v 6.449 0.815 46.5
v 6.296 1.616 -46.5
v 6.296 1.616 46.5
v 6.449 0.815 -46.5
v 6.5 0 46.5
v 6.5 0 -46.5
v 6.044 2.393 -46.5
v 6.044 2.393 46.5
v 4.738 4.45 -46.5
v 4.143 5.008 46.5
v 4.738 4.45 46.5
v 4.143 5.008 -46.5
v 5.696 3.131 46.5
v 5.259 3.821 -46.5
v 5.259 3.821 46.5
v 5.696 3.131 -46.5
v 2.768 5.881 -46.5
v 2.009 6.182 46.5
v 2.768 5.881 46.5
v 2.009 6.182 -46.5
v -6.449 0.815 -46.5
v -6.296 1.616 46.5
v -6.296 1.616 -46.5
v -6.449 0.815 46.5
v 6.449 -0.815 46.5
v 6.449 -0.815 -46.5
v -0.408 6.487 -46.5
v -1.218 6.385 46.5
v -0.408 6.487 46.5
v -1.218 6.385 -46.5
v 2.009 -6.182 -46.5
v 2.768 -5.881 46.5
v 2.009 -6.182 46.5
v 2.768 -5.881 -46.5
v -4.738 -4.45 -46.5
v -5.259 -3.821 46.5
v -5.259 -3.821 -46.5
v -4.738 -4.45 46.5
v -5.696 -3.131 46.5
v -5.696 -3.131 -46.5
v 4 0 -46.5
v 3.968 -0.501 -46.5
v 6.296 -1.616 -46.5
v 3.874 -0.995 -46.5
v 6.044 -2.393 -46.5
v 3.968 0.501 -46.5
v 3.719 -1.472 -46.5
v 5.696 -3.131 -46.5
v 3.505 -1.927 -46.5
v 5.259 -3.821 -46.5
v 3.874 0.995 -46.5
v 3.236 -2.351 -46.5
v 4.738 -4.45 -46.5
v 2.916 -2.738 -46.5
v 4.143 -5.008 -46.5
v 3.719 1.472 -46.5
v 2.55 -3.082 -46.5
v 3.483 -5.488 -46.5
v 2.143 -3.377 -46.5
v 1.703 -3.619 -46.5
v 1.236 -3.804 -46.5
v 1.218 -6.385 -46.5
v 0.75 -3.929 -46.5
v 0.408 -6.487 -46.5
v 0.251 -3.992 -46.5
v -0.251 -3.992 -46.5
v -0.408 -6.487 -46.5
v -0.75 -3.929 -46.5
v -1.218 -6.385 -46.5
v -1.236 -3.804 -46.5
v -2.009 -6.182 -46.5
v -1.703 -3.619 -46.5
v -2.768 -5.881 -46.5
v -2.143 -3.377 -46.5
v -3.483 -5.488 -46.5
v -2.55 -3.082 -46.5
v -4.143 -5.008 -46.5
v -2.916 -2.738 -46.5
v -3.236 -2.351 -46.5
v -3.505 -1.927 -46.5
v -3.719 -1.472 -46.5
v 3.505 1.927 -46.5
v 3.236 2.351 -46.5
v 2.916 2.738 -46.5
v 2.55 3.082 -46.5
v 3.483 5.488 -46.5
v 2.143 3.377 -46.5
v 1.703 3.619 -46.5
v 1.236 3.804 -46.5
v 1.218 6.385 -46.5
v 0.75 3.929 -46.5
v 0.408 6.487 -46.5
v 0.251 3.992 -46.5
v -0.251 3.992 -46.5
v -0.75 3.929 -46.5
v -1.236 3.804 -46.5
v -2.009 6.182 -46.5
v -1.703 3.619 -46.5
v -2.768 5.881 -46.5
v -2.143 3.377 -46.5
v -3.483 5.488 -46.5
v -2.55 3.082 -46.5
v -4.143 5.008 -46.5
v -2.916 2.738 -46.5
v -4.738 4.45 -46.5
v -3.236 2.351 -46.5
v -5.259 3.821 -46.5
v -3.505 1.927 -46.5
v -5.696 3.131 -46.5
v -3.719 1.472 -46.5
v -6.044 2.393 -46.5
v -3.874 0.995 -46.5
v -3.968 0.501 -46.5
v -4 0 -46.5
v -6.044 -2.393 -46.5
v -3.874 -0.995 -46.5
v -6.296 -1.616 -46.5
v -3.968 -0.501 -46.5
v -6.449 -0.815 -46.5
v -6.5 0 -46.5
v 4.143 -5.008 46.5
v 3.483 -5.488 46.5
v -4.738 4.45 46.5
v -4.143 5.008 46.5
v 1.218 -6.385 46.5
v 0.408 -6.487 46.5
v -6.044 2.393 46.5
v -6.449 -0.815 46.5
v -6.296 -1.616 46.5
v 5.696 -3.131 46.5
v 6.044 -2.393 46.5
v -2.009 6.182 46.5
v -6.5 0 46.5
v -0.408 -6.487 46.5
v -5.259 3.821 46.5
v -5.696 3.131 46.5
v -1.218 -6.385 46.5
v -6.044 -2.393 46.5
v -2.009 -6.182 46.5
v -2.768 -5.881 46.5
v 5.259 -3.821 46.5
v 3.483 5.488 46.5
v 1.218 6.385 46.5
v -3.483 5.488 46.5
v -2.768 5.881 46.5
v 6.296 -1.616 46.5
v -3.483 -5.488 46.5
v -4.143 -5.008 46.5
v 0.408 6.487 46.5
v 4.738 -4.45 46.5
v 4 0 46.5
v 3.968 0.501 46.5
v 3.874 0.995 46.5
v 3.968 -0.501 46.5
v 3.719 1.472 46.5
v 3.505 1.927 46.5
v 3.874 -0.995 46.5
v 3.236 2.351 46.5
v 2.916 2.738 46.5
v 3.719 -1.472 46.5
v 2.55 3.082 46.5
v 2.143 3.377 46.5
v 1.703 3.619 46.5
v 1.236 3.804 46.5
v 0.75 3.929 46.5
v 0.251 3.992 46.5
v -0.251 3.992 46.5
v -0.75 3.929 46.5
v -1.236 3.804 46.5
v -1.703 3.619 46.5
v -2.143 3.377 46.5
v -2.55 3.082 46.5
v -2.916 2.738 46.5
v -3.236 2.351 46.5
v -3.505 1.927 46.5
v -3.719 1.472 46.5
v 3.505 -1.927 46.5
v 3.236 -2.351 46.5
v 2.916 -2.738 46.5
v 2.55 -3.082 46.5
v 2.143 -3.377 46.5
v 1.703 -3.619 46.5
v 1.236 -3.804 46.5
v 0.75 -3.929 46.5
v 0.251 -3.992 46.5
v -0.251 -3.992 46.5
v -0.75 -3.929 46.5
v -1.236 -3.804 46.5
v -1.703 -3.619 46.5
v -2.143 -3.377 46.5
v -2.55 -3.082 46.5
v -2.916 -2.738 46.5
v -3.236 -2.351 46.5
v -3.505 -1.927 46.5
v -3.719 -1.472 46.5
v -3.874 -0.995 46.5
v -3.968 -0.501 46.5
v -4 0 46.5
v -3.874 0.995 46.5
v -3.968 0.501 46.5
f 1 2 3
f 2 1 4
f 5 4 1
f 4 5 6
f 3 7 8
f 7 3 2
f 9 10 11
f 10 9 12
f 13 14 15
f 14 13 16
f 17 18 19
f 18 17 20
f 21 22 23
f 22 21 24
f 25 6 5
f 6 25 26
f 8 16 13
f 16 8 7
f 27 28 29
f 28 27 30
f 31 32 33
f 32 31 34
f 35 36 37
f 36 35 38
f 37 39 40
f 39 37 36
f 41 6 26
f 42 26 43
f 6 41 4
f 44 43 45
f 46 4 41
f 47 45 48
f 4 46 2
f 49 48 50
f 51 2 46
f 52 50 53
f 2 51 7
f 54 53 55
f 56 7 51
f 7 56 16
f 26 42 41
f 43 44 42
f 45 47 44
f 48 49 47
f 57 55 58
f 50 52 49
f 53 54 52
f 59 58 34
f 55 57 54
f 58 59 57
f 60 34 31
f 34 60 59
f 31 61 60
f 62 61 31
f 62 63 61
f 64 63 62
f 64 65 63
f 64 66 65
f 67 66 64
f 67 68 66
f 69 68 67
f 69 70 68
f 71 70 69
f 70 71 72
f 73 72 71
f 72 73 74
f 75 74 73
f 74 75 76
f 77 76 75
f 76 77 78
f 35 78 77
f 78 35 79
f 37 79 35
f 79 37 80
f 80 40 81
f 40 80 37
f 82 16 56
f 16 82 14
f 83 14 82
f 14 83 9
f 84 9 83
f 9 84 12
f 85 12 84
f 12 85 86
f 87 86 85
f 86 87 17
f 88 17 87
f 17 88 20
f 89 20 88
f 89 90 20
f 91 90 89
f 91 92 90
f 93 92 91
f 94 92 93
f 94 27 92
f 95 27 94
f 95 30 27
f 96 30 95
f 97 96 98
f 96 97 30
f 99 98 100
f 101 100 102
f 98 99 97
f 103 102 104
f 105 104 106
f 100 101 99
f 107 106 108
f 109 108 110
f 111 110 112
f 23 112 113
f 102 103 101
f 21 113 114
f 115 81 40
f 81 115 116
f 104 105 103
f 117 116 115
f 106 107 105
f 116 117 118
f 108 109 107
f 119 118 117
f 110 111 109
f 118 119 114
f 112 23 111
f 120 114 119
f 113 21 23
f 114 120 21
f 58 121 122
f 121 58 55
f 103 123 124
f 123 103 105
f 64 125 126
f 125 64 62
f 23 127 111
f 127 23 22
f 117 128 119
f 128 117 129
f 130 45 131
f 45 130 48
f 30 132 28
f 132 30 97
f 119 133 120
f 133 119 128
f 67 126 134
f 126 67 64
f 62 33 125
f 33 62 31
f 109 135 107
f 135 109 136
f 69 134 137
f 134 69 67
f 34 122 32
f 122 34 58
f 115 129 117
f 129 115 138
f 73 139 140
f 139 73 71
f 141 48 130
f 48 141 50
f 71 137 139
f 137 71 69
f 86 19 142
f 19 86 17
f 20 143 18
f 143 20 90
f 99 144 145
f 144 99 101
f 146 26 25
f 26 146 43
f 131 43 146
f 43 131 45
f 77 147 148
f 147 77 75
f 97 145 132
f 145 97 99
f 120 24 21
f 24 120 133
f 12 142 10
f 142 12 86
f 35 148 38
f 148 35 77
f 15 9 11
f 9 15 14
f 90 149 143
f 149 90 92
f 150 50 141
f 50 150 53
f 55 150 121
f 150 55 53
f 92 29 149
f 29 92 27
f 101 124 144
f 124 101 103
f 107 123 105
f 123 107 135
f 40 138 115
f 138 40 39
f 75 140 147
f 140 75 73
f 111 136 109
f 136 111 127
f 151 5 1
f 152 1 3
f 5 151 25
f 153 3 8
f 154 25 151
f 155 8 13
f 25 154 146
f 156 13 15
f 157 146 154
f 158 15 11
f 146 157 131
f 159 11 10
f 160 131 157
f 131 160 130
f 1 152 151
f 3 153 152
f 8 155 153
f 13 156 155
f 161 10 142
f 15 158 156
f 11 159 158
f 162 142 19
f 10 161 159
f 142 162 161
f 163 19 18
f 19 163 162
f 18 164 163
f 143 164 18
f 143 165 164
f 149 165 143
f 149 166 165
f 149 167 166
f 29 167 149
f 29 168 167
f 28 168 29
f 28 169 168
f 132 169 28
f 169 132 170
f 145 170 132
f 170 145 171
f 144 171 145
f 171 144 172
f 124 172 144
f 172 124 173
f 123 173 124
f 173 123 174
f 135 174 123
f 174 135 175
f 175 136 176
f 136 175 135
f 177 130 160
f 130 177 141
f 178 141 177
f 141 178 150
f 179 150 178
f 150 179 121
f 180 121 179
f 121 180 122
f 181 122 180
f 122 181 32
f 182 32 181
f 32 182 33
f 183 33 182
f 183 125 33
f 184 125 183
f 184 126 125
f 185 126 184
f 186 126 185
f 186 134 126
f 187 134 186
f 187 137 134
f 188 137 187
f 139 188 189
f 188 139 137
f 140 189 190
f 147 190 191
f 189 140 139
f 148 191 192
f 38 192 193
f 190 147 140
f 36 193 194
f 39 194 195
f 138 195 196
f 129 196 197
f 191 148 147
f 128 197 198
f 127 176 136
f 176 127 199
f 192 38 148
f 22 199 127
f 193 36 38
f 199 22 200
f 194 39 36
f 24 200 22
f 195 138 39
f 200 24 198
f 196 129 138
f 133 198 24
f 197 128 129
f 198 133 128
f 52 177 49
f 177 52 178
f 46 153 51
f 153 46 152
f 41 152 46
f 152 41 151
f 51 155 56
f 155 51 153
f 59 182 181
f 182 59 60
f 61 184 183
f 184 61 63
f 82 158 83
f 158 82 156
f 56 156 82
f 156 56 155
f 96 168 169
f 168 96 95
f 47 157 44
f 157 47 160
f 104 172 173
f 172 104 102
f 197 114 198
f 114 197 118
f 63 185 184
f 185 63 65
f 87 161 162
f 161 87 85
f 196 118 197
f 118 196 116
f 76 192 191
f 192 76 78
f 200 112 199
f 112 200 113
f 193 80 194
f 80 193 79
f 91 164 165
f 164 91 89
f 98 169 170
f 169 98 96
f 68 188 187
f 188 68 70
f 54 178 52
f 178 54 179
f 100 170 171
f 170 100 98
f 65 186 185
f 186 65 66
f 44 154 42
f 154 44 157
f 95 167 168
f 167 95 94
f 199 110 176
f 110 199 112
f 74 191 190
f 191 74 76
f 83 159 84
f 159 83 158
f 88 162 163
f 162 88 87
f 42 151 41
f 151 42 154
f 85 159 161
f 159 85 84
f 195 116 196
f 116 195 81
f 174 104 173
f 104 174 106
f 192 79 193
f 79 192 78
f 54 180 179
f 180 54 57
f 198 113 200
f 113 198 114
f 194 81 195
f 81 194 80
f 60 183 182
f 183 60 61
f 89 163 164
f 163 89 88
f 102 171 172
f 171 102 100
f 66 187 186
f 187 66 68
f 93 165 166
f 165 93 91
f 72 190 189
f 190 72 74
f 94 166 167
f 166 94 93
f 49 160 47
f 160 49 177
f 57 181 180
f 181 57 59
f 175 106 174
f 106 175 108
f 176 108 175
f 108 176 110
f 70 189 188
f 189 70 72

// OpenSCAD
$fn = 50;


difference() {
	union() {
		translate(v = [0, 0, -46.5000000000]) {
			cylinder(h = 93, r = 6.5000000000);
		}
	}
	union() {
		translate(v = [0, 0, -100.0000000000]) {
			cylinder(h = 200, r = 4.0000000000);
		}
	}
}
